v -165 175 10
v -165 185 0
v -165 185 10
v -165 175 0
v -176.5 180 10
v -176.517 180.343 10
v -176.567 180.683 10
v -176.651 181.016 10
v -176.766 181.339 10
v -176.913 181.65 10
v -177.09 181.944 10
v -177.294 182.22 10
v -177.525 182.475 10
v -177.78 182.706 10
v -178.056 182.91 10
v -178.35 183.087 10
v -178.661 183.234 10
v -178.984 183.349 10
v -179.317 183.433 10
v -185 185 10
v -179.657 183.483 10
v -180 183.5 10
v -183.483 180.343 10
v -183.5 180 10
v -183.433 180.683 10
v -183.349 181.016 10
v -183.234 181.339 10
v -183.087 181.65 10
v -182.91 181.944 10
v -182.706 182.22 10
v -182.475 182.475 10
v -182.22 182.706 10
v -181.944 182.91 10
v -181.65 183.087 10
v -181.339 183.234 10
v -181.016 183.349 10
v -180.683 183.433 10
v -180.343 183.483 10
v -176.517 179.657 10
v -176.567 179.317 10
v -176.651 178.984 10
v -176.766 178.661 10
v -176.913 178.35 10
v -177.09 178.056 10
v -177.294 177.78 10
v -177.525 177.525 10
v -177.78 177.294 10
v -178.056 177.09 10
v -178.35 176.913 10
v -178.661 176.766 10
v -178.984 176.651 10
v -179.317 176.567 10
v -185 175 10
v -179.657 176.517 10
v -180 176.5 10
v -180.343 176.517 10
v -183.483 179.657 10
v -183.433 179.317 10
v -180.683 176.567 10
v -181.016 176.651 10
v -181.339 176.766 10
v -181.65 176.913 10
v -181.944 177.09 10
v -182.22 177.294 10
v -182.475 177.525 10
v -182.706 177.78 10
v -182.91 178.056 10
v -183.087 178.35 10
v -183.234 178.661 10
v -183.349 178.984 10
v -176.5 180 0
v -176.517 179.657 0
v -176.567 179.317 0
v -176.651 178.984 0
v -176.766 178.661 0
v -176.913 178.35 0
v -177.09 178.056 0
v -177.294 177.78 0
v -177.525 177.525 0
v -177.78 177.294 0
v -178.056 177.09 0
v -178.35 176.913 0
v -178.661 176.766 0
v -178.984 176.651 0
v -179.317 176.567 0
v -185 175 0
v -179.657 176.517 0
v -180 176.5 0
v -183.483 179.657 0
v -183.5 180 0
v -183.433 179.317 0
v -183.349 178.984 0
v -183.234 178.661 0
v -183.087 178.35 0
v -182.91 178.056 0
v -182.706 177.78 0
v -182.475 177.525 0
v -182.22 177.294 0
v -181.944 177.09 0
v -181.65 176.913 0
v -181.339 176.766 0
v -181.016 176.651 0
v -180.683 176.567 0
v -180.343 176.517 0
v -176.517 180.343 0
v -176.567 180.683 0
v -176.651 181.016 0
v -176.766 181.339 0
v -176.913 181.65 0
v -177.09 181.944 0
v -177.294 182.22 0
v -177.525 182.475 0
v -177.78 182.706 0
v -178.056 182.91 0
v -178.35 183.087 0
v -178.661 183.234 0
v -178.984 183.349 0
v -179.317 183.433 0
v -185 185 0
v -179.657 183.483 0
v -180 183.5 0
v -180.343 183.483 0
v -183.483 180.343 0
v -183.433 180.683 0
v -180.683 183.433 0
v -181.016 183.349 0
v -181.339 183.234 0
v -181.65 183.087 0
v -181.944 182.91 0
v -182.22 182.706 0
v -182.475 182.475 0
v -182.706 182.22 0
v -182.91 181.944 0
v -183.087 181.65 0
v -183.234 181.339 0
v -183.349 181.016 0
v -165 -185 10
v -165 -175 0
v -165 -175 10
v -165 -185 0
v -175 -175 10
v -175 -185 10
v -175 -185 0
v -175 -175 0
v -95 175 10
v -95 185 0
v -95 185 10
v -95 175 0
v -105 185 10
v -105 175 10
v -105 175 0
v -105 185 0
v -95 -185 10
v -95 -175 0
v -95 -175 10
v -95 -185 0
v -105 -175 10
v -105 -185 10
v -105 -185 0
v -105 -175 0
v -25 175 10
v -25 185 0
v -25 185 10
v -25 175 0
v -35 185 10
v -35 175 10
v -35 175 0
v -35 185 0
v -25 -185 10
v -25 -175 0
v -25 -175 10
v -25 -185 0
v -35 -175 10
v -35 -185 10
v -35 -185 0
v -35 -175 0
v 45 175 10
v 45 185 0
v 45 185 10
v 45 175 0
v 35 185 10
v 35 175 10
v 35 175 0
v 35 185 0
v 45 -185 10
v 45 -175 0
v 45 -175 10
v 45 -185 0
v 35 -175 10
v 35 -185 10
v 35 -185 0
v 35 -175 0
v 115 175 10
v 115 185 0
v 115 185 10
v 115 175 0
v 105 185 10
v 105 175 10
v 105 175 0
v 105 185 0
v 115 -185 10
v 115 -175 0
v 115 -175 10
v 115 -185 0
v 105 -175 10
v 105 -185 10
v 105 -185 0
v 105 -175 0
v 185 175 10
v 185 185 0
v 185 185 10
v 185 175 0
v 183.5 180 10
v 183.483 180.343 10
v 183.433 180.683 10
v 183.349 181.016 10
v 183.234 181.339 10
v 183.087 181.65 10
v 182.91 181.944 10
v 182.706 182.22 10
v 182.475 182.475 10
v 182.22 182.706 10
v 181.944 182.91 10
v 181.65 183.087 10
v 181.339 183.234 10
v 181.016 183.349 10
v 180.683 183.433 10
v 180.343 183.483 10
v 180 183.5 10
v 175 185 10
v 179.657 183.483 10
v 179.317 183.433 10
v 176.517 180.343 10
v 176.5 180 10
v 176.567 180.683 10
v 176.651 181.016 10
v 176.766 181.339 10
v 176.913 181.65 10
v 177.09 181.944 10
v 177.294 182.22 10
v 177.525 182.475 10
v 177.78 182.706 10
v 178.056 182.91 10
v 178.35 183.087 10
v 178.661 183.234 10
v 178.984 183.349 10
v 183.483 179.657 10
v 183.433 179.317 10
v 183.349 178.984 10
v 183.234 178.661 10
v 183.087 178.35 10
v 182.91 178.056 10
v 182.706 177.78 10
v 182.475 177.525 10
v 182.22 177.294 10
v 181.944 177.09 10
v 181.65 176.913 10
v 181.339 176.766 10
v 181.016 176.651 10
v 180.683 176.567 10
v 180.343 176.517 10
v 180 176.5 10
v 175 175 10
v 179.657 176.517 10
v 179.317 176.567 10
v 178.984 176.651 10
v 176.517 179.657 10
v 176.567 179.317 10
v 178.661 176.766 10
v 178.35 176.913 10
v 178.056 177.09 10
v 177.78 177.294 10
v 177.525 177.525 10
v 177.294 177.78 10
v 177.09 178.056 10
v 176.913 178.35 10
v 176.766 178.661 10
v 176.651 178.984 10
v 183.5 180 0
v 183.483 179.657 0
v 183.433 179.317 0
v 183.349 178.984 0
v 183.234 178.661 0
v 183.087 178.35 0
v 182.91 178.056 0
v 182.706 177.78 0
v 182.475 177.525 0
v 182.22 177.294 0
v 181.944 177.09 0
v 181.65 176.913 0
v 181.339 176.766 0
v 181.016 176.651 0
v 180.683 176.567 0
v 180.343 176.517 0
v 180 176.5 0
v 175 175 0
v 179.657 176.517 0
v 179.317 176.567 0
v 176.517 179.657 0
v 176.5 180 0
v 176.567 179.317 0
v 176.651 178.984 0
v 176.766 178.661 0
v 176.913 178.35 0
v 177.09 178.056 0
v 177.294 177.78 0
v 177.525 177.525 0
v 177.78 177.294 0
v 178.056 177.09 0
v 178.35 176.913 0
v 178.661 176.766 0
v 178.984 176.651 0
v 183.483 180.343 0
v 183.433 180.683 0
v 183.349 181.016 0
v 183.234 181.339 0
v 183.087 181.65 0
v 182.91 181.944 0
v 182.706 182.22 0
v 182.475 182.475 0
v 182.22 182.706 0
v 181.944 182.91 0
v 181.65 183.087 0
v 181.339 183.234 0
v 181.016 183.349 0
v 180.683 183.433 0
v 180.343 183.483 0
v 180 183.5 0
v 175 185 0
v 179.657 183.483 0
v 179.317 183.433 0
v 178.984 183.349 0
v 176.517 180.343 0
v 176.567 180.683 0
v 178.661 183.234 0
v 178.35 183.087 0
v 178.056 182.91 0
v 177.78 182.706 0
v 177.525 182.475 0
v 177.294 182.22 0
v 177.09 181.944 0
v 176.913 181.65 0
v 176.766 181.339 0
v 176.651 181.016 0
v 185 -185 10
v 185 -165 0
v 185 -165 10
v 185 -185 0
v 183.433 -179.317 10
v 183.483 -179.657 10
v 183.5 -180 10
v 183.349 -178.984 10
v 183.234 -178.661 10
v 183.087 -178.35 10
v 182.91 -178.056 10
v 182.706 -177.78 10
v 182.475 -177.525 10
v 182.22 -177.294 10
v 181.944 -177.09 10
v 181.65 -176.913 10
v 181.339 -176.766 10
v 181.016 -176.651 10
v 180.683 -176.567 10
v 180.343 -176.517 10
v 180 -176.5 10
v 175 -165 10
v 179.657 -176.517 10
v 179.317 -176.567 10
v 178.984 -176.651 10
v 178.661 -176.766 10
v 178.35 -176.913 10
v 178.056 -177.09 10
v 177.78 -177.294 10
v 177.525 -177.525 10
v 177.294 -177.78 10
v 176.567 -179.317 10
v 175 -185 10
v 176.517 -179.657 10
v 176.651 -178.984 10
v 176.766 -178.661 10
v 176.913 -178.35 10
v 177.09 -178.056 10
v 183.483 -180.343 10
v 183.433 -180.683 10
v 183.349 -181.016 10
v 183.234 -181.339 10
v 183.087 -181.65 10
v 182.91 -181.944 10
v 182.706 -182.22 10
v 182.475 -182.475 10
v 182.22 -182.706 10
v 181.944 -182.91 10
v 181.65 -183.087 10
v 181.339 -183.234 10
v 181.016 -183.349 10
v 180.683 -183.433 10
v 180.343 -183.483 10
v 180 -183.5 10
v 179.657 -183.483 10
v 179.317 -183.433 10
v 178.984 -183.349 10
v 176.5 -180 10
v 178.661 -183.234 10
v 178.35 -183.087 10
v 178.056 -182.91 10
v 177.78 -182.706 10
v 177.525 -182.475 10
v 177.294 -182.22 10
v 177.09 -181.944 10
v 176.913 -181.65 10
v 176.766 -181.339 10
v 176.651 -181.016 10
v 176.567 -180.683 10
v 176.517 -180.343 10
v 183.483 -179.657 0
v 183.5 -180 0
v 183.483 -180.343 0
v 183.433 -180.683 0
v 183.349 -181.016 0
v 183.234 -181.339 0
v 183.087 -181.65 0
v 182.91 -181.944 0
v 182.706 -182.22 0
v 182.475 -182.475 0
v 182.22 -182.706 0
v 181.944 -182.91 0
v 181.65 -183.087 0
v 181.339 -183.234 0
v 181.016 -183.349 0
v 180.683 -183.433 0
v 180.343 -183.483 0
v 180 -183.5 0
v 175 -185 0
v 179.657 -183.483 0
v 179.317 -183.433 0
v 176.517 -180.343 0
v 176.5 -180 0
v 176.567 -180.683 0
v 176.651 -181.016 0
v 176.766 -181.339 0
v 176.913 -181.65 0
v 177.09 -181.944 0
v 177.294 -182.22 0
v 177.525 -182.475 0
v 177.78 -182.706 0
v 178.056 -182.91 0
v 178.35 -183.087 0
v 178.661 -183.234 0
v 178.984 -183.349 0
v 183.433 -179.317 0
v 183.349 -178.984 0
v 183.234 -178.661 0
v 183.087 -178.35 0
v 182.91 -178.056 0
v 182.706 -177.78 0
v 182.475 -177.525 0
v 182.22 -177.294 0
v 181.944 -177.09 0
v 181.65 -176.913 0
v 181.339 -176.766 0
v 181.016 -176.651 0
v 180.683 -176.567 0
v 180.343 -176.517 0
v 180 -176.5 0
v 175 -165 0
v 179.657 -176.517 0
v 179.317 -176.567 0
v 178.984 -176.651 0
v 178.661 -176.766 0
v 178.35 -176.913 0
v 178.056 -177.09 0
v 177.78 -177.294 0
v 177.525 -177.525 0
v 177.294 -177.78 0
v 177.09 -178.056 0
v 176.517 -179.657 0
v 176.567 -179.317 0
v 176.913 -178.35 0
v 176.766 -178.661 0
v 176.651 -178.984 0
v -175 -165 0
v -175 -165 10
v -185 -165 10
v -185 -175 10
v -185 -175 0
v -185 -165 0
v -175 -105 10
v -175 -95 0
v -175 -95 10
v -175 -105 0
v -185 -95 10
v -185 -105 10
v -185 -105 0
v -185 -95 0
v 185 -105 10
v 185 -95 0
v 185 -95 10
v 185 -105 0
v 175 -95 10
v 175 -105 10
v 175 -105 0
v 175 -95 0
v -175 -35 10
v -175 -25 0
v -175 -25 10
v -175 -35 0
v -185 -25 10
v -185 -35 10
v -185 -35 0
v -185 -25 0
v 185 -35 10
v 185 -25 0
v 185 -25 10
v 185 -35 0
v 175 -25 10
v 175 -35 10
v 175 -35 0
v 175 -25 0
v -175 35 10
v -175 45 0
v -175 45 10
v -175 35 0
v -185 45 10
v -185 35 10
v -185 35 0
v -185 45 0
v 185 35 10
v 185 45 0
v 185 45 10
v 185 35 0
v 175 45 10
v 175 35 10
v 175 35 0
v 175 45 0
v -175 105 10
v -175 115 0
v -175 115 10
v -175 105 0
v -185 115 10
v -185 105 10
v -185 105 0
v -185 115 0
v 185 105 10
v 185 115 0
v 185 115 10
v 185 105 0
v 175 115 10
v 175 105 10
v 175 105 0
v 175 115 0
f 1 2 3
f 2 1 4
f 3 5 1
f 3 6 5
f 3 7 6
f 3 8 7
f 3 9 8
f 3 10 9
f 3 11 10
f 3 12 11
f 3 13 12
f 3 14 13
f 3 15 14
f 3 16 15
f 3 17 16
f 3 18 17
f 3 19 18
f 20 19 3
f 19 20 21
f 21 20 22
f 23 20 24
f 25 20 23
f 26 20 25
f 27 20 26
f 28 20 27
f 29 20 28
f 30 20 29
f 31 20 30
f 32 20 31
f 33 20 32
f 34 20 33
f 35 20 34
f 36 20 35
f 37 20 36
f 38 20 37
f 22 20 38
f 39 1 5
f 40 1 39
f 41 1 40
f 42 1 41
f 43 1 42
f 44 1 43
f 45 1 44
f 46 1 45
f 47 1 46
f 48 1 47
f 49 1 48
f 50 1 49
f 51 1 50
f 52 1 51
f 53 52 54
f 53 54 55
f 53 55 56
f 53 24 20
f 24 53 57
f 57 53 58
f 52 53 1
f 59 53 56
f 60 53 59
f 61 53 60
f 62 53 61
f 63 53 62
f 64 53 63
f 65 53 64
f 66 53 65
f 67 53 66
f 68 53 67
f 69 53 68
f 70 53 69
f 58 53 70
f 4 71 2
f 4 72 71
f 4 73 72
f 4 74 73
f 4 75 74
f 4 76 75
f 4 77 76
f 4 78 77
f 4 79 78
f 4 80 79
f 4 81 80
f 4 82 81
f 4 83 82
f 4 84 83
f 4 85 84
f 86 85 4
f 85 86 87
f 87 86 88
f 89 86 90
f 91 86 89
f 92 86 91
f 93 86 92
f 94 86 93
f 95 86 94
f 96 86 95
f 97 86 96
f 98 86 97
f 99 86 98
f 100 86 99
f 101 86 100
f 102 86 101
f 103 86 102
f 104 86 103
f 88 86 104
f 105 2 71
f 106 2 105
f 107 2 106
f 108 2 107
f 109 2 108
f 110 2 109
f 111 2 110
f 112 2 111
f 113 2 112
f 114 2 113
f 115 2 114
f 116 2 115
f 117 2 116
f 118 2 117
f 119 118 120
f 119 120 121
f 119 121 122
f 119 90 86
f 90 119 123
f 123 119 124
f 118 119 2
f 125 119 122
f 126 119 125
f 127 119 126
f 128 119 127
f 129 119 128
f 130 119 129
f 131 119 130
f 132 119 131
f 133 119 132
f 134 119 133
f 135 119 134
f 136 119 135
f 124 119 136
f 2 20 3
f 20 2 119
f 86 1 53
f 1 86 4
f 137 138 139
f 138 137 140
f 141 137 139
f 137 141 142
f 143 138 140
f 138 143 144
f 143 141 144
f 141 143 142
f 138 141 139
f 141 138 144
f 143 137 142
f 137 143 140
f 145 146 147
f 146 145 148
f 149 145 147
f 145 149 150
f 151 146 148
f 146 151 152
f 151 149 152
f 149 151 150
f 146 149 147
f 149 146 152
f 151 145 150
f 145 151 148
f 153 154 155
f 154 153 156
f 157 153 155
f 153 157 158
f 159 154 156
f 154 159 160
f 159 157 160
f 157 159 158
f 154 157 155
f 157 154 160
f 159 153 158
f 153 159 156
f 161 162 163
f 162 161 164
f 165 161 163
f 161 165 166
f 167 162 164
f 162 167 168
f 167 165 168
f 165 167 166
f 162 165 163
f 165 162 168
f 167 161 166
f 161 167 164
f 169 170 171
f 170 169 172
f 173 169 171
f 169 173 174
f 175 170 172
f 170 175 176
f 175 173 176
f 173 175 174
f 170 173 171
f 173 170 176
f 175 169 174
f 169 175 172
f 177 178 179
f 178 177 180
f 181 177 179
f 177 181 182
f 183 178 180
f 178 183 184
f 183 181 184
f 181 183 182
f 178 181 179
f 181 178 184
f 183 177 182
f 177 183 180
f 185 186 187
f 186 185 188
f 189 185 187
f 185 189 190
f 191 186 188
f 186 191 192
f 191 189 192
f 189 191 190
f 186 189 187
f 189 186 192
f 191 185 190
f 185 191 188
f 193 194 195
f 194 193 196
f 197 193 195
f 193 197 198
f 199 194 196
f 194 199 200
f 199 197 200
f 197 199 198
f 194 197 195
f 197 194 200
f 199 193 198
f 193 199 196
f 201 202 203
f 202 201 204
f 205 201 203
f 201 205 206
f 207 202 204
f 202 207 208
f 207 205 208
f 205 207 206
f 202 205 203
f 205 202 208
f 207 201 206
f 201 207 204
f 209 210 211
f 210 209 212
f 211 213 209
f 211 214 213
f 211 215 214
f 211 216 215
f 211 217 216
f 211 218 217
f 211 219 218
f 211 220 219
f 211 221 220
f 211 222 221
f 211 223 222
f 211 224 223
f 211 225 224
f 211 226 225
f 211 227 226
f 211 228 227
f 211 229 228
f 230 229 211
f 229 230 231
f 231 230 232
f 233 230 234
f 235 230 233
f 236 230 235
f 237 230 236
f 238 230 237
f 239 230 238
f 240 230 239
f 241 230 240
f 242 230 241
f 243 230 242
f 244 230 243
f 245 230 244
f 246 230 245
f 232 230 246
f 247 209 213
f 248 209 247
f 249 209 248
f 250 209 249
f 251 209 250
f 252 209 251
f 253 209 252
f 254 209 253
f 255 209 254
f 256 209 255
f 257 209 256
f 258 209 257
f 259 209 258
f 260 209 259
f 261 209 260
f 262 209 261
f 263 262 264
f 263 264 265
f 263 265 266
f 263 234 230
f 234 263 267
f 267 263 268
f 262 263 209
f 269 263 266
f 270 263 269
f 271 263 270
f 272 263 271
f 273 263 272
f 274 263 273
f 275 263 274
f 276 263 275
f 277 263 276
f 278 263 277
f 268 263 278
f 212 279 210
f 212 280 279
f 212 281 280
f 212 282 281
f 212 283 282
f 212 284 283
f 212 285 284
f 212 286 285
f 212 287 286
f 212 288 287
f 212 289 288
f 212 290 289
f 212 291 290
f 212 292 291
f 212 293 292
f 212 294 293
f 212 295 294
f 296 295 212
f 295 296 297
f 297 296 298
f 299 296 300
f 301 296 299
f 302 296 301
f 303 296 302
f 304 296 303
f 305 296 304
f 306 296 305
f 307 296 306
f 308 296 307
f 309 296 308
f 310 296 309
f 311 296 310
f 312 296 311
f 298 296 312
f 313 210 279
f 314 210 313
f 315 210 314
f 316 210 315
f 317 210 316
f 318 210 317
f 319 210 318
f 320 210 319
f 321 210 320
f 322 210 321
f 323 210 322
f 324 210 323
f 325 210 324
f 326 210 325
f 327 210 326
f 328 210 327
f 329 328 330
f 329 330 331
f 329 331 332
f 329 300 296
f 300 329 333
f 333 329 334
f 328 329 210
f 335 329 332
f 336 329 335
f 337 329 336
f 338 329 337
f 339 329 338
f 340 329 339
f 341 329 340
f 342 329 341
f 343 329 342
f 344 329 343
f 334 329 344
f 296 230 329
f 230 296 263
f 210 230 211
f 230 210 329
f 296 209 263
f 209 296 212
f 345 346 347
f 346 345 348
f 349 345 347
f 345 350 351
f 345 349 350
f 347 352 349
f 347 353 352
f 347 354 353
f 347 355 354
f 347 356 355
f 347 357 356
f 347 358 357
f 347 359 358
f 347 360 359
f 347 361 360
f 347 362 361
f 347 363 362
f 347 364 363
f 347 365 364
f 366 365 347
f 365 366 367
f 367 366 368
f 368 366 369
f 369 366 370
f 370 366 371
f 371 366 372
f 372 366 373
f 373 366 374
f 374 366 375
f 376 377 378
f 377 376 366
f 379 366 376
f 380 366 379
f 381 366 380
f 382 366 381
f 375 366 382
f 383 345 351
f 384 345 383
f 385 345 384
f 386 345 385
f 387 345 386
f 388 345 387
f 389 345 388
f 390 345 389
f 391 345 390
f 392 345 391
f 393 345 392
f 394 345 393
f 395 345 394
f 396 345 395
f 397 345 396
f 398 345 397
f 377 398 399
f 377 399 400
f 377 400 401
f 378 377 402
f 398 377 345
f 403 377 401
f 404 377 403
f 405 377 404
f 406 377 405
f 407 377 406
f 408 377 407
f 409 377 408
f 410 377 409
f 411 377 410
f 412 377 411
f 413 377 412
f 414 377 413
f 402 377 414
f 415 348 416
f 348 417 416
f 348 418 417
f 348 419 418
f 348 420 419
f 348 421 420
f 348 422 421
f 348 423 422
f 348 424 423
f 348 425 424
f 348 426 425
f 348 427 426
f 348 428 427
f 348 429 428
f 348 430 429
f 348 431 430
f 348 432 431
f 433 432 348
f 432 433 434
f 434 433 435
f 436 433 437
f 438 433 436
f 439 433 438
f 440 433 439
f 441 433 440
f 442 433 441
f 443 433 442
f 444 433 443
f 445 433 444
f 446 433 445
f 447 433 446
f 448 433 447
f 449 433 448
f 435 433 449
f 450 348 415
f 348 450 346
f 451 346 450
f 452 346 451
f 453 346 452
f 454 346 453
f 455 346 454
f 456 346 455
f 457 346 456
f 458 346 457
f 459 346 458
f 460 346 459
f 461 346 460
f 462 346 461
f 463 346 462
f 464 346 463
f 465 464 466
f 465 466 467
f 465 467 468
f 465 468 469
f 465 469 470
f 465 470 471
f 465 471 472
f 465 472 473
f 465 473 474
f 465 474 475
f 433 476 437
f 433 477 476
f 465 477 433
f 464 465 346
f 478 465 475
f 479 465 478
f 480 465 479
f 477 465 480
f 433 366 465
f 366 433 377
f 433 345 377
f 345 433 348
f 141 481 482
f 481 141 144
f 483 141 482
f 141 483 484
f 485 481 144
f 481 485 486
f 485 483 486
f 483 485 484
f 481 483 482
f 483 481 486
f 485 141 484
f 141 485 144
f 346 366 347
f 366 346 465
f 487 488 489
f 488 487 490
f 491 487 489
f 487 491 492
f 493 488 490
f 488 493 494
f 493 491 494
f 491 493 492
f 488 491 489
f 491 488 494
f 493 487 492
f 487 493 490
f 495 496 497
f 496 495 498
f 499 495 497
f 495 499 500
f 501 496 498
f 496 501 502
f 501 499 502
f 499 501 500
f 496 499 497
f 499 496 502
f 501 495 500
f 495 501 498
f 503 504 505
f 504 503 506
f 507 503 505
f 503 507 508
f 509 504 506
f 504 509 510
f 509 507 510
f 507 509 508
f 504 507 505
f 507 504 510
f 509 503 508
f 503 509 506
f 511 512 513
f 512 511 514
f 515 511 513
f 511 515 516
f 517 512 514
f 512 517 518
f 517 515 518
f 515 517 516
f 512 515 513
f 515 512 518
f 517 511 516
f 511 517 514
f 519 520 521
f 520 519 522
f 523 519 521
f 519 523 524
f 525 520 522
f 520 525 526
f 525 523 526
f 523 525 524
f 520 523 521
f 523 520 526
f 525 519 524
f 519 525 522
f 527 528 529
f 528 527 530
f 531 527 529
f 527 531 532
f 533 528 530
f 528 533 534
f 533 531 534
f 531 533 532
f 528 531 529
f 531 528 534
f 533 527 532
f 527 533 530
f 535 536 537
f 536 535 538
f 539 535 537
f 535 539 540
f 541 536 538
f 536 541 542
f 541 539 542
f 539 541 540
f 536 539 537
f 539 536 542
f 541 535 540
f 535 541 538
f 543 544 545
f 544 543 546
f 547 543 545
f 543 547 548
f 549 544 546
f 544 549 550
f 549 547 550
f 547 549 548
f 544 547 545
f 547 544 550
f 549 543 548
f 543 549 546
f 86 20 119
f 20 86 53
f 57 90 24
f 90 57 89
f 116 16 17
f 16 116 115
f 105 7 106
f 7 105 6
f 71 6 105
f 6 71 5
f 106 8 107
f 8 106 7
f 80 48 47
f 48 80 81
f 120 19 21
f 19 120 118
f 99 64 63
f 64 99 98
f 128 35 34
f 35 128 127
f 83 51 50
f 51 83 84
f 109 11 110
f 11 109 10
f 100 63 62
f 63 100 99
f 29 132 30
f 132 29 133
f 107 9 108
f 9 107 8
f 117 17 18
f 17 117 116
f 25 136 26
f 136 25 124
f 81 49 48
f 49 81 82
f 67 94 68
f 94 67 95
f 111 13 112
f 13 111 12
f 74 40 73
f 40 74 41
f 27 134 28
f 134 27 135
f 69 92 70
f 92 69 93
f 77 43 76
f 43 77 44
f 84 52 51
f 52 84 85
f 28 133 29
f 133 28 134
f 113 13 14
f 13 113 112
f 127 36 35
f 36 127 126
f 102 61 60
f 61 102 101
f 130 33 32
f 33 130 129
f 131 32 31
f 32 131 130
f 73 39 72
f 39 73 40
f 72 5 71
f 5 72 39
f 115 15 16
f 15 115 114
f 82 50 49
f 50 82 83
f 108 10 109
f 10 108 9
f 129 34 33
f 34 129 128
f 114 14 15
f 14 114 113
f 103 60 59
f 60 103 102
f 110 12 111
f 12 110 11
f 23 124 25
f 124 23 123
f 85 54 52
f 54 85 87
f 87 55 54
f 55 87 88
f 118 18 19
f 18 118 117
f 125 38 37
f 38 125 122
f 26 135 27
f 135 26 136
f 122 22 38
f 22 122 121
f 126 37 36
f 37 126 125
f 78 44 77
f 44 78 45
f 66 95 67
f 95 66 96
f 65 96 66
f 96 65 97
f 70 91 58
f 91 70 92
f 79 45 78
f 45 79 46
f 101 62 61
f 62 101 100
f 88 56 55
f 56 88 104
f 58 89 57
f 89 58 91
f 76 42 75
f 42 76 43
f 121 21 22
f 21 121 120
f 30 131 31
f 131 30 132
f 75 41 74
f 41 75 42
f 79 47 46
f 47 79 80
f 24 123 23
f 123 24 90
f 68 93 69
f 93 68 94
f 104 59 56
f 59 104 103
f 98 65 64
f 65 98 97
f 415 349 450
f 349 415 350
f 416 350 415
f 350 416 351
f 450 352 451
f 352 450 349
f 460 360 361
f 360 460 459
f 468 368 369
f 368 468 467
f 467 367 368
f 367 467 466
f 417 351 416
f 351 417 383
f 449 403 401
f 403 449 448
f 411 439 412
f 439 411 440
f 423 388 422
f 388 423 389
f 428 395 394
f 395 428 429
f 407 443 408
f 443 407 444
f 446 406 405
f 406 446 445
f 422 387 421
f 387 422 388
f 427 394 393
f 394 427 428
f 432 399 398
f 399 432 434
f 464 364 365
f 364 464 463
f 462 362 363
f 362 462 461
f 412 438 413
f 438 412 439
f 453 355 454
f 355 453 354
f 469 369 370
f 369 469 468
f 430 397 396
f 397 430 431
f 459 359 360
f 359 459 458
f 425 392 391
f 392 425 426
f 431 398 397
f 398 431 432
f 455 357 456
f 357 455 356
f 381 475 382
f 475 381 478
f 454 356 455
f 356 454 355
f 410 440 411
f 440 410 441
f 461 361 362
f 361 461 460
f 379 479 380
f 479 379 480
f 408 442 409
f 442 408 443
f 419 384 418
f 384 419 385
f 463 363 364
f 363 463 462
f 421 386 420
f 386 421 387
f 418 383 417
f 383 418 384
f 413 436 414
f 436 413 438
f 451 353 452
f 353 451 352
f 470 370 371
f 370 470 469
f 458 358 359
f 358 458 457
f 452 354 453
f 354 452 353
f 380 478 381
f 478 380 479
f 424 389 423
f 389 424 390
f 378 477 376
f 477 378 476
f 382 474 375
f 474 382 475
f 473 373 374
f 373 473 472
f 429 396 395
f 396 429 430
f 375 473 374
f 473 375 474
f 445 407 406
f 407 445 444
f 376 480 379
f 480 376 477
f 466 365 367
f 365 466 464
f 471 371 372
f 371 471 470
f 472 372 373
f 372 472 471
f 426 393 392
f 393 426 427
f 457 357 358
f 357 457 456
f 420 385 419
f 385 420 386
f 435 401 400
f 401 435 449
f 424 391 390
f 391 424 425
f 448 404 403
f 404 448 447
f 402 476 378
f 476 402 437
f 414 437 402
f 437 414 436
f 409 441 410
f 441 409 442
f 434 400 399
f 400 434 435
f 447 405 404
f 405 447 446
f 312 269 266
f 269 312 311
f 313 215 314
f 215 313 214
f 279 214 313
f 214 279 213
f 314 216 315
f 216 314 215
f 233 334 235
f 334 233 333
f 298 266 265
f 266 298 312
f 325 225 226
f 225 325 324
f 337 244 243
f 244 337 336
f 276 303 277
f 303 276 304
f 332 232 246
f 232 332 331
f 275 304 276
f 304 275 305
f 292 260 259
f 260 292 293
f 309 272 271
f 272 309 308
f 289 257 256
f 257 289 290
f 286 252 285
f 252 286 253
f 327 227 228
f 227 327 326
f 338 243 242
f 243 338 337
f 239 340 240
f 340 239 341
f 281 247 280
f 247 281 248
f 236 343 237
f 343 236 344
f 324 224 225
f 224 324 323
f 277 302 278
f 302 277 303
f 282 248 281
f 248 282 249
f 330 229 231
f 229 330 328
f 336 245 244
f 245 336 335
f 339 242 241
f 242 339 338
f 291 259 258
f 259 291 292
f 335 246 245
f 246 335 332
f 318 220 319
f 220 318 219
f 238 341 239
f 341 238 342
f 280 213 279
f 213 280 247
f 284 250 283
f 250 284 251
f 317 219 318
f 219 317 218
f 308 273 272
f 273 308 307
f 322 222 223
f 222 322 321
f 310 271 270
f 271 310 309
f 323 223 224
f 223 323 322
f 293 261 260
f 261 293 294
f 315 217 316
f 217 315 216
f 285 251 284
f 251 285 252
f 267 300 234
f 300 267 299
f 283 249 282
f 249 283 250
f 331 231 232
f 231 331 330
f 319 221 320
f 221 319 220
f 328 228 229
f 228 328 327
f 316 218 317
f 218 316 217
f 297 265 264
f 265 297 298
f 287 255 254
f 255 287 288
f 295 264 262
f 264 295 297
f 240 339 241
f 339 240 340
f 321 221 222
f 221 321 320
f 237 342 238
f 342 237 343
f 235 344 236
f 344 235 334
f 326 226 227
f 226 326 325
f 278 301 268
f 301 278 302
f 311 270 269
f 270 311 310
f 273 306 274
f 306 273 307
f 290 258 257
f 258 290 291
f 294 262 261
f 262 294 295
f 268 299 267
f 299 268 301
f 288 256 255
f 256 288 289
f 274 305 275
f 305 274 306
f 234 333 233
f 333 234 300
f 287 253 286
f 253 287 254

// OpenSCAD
// ring_30.scad - ring index 30 (z bottom = 300 mm)
$fn = 64; bar = 10; half_b = bar/2; outer = 370; half_outer = outer/2;
front_y = 180; back_y = -180; left_x = -180; right_x = 180;
x_centers = [-170, -100, -30, 40, 110, 180];
z_centers = [5, 85, 155, 225, 295, 365, 435, 505, 575, 645, 715]; ring_z = 300;
module place_box(cx, cy, sx, sy) { translate([cx - sx/2, cy - sy/2, 0]) cube([sx, sy, bar]); }

difference() { union() {
    for (x = x_centers) { place_box(x, front_y, bar, bar); place_box(x, back_y, bar, bar); }
    for (y = x_centers) { place_box(left_x, y, bar, bar); place_box(right_x, y, bar, bar); }
    for (zc = z_centers) if ((zc - half_b < ring_z + bar) && (zc + half_b > ring_z)) {
        translate([-half_outer, front_y - half_b, 0]) cube([outer, bar, bar]);
        translate([-half_outer, back_y - half_b, 0])  cube([outer, bar, bar]);
        translate([left_x - half_b, -half_outer, 0])  cube([bar, outer, bar]);
        translate([right_x - half_b, -half_outer, 0]) cube([bar, outer, bar]);
    }
  }
  for (cx = [-180, 180]) for (cy = [-180, 180]) translate([cx, cy, 0]) cylinder(h = bar, r = 3.5, $fn = 64);
}
